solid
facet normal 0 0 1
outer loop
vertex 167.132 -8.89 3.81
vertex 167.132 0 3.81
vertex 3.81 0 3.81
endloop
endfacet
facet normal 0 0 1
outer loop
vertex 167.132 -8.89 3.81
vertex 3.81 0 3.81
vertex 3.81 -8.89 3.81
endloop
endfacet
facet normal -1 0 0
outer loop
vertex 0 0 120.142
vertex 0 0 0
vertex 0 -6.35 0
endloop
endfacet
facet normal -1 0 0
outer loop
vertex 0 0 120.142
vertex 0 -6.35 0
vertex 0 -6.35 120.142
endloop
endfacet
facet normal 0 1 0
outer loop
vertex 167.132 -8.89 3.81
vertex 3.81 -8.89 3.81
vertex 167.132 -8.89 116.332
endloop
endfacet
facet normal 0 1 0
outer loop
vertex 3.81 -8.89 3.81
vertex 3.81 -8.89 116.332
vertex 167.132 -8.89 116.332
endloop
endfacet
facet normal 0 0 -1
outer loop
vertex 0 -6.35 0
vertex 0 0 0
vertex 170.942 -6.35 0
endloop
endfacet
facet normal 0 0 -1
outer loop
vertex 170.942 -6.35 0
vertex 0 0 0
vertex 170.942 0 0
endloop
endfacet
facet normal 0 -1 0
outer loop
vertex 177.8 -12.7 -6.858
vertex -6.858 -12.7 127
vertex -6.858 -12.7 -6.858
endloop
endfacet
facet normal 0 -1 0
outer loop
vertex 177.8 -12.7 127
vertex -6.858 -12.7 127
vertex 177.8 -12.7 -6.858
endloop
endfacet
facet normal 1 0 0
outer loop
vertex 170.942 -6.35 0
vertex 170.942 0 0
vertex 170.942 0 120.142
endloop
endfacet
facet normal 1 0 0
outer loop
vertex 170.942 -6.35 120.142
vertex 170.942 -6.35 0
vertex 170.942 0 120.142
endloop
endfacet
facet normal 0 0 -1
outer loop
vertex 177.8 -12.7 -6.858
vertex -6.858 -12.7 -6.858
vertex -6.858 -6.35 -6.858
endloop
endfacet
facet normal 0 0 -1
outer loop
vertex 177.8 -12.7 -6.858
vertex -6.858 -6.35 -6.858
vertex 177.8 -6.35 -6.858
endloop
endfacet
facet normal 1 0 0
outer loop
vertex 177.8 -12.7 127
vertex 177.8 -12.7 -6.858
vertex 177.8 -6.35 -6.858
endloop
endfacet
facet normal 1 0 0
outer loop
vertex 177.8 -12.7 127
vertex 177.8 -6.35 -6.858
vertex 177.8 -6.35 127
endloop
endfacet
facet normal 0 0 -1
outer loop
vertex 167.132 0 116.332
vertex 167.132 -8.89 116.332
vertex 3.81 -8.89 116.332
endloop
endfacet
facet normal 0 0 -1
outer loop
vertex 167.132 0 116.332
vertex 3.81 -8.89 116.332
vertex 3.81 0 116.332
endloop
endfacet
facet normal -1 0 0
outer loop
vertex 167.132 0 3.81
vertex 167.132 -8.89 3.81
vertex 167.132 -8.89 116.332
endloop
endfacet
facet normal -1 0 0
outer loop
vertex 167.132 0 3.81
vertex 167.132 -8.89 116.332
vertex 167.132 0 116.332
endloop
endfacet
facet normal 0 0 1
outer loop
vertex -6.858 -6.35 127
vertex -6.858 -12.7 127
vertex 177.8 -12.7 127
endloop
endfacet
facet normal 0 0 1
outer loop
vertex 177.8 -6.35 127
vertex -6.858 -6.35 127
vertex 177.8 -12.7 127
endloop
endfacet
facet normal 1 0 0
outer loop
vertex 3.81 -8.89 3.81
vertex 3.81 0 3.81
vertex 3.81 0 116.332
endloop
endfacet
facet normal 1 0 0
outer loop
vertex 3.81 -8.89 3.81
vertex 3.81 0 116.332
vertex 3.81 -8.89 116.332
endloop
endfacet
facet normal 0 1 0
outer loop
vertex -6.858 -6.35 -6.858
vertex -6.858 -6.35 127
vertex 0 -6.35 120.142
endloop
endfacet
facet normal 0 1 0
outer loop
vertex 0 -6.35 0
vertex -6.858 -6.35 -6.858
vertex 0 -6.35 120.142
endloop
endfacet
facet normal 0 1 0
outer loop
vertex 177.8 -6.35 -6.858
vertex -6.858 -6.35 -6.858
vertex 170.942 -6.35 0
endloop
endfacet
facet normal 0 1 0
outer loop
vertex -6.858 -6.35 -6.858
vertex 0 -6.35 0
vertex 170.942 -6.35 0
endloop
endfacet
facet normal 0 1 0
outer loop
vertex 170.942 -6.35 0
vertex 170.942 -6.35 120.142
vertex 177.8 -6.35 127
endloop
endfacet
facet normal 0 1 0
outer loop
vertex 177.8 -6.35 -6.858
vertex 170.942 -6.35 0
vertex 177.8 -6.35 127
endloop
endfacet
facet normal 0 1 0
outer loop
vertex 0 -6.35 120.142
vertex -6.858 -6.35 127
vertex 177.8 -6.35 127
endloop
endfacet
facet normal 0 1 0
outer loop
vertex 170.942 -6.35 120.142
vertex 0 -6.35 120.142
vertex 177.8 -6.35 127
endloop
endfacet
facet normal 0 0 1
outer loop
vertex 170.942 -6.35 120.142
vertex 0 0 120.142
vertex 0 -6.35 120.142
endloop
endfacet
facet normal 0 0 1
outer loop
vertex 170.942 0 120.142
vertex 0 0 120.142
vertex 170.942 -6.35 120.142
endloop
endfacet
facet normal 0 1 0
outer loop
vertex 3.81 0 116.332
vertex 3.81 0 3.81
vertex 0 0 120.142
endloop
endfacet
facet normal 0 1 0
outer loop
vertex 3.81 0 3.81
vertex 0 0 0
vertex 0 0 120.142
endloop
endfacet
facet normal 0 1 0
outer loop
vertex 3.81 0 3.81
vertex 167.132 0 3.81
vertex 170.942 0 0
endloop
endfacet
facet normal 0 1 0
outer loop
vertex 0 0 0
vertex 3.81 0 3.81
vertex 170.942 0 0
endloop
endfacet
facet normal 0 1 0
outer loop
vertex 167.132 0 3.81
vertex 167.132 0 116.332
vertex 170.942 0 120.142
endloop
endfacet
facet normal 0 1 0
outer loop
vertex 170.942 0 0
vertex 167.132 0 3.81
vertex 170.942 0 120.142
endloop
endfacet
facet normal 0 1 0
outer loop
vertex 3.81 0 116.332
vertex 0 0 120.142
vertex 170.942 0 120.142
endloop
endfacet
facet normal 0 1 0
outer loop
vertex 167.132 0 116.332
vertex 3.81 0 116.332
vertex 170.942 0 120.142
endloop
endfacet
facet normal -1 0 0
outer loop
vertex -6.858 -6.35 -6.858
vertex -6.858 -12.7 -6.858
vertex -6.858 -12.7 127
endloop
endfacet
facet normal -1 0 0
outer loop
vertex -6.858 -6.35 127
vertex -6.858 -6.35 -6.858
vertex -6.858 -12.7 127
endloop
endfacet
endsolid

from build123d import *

# Parameters (mm, degrees)
F0_W        = 170.942
F0_H        = 120.142
F1_DEPTH    = 12.7
F2_W        = 184.658
F2_H        = 133.858
F2_W_2      = 170.942
F2_H_2      = 120.142
F3_DEPTH    = 6.35
F4_T        = 3.81
F4_T3_DEPTH = 127.762
F4_T5_DEPTH = 178.562


# Not quite as in the source:
# - a shell that OpenCascade refuses in one call is made with other operations: the cavity is built on its own and cut out


with BuildPart() as f1:
    # F0 (on Front) → F1 (new body)
    with BuildSketch(Plane.XZ):
        with Locations((85.471, 60.071)):
            Rectangle(F0_W, F0_H)
    extrude(amount=F1_DEPTH)

    # F2 (on face) → F3 (join)
    with BuildSketch(Plane.XZ.offset(12.7)):
        with Locations((85.471, 60.071)):
            Rectangle(F2_W, F2_H)
        with Locations((85.471, 60.071)):
            Rectangle(F2_W_2, F2_H_2, mode=Mode.SUBTRACT)
    extrude(amount=-F3_DEPTH)

    # F4: shell of thickness 3.81, made by hand


with BuildPart() as f4_core1:
    # F4_t2: copy of F1
    add(f1.part)

    # the walls: a layer under each face that stays
    f4_faces = [f4_core1.faces().sort_by_distance(p)[0] for p in [
        (0, -3.175, 60.071),
        (85.471, -3.175, 0),
        (-0.7027333333, -6.35, -2.3960666667),
        (85.471, -3.175, 120.142),
        (170.942, -3.175, 60.071),
        (-6.858, -9.525, 60.071),
        (85.471, -9.525, -6.858),
        (177.8, -9.525, 60.071),
        (85.471, -9.525, 127),
        (85.471, -12.7, 60.071),
    ]]
    thicken(f4_faces, amount=-F4_T, mode=Mode.SUBTRACT)

    # F4_s4 → F4_t3 (cut)
    with BuildSketch(Plane.XY.offset(-3.81)):
        Polygon((-0.0381, -6.3119), (3.81, -6.35), (3.81, -10.16), (0, -10.16), align=None)
        Polygon((170.9801, -6.3119), (170.942, -10.16), (167.132, -10.16), (167.132, -6.35), align=None)
    extrude(amount=F4_T3_DEPTH, mode=Mode.SUBTRACT)

    # F4_s6 → F4_t5 (cut)
    with BuildSketch(Plane.YZ.offset(-3.81)):
        Polygon((-6.3119, -0.0381), (-6.35, 3.81), (-10.16, 3.81), (-10.16, 0), align=None)
        Polygon((-6.3119, 120.1801), (-10.16, 120.142), (-10.16, 116.332), (-6.35, 116.332), align=None)
    extrude(amount=F4_T5_DEPTH, mode=Mode.SUBTRACT)


with BuildPart() as f1_1:
    add(f1.part)

    # what is left inside the walls is the cavity
    f4_cavity = [f4_core1.part.solids().sort_by_distance(p)[0] for p in [
        (85.471, -8.8519, 41.317333),
    ]]
    add(f4_cavity, mode=Mode.SUBTRACT)


solid = f1_1.part
